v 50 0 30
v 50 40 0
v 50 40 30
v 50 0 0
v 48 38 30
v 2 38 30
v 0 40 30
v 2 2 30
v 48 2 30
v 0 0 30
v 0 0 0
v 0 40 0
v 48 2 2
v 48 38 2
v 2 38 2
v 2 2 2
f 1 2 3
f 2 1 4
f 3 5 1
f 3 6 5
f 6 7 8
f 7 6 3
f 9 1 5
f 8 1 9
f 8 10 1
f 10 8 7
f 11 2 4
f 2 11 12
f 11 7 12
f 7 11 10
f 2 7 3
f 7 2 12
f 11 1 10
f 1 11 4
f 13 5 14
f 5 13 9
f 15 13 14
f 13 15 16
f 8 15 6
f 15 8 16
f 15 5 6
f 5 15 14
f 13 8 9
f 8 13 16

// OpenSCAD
// OpenSCAD parametric design
$fn = 100; // Resolution
wall_thickness = 2;
box_width = 50;
box_height = 30;
box_depth = 40;

module printable_box() {
    difference() {
        cube([box_width, box_depth, box_height]);
        translate([wall_thickness, wall_thickness, wall_thickness])
            cube([box_width-2*wall_thickness, 
                  box_depth-2*wall_thickness, 
                  box_height]);
    }
}

printable_box();
